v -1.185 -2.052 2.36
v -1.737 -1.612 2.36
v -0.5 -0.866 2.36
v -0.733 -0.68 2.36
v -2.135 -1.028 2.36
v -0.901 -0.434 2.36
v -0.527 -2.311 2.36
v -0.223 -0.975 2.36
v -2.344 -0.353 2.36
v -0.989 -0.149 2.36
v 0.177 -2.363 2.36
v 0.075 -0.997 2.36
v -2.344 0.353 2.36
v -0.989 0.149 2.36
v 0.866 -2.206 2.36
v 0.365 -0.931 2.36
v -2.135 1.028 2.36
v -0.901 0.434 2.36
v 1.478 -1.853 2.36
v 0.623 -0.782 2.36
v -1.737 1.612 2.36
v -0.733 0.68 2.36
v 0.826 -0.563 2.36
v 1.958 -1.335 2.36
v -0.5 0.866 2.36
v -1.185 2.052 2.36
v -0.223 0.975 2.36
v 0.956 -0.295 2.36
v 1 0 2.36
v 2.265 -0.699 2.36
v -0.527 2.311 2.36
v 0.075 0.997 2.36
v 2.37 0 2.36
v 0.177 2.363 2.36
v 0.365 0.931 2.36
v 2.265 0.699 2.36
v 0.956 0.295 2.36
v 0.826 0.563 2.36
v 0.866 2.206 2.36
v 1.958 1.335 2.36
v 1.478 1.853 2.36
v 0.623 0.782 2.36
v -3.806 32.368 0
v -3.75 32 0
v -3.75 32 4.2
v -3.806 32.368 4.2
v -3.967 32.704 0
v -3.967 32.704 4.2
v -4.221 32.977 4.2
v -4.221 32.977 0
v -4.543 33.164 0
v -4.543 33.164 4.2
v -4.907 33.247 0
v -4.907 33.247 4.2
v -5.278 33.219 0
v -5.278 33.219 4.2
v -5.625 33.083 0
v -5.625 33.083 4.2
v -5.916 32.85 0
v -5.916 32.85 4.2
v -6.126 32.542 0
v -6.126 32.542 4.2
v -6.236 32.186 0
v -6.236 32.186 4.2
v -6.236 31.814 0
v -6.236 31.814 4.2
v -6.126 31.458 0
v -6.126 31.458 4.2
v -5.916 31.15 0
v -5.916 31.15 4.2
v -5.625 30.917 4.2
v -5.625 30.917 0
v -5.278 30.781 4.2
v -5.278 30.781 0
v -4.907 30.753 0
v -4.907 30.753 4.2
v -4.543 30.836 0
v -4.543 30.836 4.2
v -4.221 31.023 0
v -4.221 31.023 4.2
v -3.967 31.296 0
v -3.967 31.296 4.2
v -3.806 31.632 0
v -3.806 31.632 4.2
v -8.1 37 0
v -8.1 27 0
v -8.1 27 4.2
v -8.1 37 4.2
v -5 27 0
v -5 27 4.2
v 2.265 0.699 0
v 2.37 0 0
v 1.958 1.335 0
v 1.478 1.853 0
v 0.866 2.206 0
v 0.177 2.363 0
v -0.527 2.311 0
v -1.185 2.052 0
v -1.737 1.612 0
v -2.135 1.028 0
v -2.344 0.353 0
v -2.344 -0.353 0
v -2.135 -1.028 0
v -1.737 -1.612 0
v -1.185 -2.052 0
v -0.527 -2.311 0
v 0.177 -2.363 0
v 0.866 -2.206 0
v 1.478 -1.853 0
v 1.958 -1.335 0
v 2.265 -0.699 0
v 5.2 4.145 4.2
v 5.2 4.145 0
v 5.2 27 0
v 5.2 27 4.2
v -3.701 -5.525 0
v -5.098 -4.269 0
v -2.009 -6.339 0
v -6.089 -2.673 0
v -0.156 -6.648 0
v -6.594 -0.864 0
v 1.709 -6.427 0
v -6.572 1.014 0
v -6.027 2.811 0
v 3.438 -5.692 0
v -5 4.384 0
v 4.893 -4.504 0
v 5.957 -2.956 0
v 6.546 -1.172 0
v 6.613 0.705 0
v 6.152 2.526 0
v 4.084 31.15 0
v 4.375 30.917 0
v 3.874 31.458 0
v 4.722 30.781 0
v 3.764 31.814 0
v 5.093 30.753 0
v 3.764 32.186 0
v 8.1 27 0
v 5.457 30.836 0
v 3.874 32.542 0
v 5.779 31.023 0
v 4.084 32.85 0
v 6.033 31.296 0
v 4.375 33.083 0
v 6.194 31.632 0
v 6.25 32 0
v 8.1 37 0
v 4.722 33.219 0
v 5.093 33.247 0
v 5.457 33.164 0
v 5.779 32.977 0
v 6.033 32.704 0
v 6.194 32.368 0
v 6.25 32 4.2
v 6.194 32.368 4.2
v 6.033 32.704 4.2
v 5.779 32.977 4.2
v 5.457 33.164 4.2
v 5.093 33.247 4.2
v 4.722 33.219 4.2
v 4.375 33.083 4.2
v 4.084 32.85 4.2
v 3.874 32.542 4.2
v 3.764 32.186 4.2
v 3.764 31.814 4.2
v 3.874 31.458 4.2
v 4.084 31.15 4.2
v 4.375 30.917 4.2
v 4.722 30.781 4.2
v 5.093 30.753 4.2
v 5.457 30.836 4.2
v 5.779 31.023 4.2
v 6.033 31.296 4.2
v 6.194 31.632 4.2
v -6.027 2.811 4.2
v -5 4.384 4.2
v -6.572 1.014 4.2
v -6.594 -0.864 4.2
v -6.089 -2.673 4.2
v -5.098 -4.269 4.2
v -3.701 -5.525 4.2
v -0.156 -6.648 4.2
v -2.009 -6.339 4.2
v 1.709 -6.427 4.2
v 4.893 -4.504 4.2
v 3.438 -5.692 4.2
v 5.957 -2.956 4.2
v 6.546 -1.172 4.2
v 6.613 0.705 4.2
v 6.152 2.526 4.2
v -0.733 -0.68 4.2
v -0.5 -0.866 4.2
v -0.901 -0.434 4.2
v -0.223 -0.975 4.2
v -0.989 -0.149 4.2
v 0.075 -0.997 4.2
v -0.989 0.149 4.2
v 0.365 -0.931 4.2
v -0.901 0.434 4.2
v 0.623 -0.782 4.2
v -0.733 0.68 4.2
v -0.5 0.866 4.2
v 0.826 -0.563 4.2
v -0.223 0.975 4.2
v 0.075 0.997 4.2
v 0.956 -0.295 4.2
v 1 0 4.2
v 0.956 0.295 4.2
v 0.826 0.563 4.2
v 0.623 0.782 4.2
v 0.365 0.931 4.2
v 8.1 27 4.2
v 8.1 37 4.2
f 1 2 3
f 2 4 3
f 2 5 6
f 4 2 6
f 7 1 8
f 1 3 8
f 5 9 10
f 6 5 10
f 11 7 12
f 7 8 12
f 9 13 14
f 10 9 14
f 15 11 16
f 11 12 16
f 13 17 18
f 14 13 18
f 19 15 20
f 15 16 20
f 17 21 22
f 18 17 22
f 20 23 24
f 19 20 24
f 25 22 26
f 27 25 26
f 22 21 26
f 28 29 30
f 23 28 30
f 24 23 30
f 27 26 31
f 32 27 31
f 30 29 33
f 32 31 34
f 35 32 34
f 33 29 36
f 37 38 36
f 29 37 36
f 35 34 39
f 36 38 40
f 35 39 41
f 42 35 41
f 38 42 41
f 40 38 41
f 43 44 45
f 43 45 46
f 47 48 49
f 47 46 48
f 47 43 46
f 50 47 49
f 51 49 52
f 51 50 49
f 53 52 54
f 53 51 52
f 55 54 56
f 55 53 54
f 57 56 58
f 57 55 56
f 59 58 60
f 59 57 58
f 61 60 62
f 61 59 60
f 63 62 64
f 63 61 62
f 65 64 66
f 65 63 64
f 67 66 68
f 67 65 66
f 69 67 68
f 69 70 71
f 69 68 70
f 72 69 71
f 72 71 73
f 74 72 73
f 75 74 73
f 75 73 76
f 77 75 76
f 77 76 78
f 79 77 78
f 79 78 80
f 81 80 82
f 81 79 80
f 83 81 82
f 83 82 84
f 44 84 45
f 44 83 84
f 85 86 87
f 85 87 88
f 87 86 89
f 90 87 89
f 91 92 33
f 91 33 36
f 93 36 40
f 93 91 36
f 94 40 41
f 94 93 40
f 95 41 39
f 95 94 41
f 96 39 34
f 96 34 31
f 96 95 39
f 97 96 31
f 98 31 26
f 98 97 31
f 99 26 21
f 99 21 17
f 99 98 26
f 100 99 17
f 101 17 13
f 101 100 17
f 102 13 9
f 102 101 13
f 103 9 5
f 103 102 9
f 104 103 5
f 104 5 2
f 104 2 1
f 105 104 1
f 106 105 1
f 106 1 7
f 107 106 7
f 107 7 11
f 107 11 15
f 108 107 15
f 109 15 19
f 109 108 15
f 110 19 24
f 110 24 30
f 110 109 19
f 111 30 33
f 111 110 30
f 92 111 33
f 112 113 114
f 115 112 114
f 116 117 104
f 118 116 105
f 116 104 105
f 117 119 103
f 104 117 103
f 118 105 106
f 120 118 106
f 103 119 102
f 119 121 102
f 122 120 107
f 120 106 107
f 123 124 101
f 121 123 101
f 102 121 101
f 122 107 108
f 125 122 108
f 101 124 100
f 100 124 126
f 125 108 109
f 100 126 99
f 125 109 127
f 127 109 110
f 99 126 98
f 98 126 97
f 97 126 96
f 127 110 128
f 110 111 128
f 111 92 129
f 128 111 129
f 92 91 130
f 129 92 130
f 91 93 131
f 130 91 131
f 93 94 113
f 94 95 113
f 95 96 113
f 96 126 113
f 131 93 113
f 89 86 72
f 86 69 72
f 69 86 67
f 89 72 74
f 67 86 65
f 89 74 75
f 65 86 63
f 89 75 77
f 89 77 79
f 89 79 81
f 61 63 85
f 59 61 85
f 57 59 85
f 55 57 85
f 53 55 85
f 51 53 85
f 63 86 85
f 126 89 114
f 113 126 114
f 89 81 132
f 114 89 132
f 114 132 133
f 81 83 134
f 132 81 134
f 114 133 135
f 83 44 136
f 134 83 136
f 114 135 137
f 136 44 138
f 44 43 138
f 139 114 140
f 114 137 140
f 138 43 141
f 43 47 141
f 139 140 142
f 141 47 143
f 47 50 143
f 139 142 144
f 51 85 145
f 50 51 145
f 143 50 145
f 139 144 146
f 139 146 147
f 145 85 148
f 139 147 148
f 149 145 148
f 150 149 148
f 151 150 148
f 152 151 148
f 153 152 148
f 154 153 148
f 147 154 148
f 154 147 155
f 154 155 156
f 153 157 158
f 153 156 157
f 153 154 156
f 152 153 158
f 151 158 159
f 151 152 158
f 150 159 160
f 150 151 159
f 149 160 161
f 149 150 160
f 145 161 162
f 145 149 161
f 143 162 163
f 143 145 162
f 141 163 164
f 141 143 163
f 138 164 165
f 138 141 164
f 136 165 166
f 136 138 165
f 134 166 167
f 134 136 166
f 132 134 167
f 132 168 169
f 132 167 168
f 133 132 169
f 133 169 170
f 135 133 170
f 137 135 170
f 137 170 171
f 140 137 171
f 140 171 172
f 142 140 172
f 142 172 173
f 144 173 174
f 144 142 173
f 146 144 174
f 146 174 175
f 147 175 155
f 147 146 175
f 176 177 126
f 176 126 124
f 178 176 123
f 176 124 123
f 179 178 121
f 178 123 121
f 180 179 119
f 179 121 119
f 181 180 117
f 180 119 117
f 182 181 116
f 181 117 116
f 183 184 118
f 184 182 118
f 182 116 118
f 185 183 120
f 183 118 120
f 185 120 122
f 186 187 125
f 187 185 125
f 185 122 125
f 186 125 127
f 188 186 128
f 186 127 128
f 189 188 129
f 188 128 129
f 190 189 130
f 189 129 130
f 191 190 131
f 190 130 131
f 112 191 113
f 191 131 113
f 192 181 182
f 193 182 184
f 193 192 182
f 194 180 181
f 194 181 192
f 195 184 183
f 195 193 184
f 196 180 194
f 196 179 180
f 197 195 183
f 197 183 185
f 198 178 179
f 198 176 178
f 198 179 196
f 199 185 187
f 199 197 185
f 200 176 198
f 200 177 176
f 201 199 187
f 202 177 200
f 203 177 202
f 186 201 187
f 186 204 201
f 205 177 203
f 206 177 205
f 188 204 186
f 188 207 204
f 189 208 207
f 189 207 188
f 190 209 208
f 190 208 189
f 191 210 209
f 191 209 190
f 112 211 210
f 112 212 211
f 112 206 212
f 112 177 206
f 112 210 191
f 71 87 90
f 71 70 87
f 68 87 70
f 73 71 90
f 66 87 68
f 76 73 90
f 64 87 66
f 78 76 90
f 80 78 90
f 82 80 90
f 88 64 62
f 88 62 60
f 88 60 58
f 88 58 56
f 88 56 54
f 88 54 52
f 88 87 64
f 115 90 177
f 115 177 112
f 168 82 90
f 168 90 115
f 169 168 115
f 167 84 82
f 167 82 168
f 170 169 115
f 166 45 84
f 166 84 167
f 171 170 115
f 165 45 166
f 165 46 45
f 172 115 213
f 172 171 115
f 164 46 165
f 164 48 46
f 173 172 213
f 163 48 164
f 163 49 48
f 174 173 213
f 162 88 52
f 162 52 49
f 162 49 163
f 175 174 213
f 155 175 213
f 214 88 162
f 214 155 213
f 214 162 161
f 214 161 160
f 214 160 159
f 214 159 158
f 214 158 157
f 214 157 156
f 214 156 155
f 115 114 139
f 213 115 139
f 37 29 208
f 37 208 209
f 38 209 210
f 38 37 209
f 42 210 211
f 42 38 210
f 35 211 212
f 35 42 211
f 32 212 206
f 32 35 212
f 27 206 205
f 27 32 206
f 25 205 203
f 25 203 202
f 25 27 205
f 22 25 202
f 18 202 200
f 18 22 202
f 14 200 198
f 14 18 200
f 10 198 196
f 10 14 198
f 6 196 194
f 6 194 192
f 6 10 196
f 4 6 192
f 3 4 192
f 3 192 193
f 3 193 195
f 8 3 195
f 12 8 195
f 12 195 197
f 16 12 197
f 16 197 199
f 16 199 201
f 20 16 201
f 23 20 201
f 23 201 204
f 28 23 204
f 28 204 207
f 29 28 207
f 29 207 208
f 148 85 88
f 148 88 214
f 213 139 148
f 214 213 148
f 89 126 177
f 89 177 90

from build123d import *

# Parameters (mm, degrees)
CYLINDER004_R     = 1.25
CYLINDER004_DEPTH = 10
CYLINDER005_R     = 1.25
CYLINDER005_DEPTH = 10
CYLINDER013_R     = 1
CYLINDER013_DEPTH = 4.2
CYLINDER002_R     = 2.37
CYLINDER002_DEPTH = 2.36
BOX003_W          = 10.2
BOX003_H          = 28
BOX003_DEPTH      = 4.2
CYLINDER006_R     = 6.65
CYLINDER006_DEPTH = 4.2
BOX005_W          = 16.200001
BOX005_H          = 10
BOX005_DEPTH      = 4.2


with BuildPart() as cylinder004:
    # Cylinder004 → Cylinder004 (new body)
    with BuildSketch(Plane(origin=(5, 32, -3), x_dir=(1, 0, 0), z_dir=(0, 0, 1))):
        Circle(CYLINDER004_R)
    extrude(amount=CYLINDER004_DEPTH)


with BuildPart() as cylinder005:
    # Cylinder005 → Cylinder005 (new body)
    with BuildSketch(Plane(origin=(-5, 32, -3), x_dir=(1, 0, 0), z_dir=(0, 0, 1))):
        Circle(CYLINDER005_R)
    extrude(amount=CYLINDER005_DEPTH)


with BuildPart() as cylinder013:
    # Cylinder013 → Cylinder013 (new body)
    with BuildSketch(Plane.XY):
        Circle(CYLINDER013_R)
    extrude(amount=CYLINDER013_DEPTH)


with BuildPart() as fusion005002:
    # Cylinder002 → Cylinder002 (new body)
    with BuildSketch(Plane.XY):
        Circle(CYLINDER002_R)
    extrude(amount=CYLINDER002_DEPTH)

    # Fusion005002: union Cylinder004, Cylinder005, Cylinder013
    add(cylinder004.part)
    add(cylinder005.part)
    add(cylinder013.part)


with BuildPart() as box003:
    # Box003 → Box003 (new body)
    with BuildSketch(Plane(origin=(-5, 4, 0), x_dir=(1, 0, 0), z_dir=(0, 0, 1))):
        with Locations((5.1, 14)):
            Rectangle(BOX003_W, BOX003_H)
    extrude(amount=BOX003_DEPTH)


with BuildPart() as cylinder006:
    # Cylinder006 → Cylinder006 (new body)
    with BuildSketch(Plane.XY):
        Circle(CYLINDER006_R)
    extrude(amount=CYLINDER006_DEPTH)


with BuildPart() as horn:
    # Box005 → Box005 (new body)
    with BuildSketch(Plane(origin=(-8.1, 27, 0), x_dir=(1, 0, 0), z_dir=(0, 0, 1))):
        with Locations((8.100001, 5)):
            Rectangle(BOX005_W, BOX005_H)
    extrude(amount=BOX005_DEPTH)

    # Fusion003: union Box003, Cylinder006
    add(box003.part)
    add(cylinder006.part)

    # Cut002002003: cut Fusion005002
    add(fusion005002.part, mode=Mode.SUBTRACT)


solid = horn.part
